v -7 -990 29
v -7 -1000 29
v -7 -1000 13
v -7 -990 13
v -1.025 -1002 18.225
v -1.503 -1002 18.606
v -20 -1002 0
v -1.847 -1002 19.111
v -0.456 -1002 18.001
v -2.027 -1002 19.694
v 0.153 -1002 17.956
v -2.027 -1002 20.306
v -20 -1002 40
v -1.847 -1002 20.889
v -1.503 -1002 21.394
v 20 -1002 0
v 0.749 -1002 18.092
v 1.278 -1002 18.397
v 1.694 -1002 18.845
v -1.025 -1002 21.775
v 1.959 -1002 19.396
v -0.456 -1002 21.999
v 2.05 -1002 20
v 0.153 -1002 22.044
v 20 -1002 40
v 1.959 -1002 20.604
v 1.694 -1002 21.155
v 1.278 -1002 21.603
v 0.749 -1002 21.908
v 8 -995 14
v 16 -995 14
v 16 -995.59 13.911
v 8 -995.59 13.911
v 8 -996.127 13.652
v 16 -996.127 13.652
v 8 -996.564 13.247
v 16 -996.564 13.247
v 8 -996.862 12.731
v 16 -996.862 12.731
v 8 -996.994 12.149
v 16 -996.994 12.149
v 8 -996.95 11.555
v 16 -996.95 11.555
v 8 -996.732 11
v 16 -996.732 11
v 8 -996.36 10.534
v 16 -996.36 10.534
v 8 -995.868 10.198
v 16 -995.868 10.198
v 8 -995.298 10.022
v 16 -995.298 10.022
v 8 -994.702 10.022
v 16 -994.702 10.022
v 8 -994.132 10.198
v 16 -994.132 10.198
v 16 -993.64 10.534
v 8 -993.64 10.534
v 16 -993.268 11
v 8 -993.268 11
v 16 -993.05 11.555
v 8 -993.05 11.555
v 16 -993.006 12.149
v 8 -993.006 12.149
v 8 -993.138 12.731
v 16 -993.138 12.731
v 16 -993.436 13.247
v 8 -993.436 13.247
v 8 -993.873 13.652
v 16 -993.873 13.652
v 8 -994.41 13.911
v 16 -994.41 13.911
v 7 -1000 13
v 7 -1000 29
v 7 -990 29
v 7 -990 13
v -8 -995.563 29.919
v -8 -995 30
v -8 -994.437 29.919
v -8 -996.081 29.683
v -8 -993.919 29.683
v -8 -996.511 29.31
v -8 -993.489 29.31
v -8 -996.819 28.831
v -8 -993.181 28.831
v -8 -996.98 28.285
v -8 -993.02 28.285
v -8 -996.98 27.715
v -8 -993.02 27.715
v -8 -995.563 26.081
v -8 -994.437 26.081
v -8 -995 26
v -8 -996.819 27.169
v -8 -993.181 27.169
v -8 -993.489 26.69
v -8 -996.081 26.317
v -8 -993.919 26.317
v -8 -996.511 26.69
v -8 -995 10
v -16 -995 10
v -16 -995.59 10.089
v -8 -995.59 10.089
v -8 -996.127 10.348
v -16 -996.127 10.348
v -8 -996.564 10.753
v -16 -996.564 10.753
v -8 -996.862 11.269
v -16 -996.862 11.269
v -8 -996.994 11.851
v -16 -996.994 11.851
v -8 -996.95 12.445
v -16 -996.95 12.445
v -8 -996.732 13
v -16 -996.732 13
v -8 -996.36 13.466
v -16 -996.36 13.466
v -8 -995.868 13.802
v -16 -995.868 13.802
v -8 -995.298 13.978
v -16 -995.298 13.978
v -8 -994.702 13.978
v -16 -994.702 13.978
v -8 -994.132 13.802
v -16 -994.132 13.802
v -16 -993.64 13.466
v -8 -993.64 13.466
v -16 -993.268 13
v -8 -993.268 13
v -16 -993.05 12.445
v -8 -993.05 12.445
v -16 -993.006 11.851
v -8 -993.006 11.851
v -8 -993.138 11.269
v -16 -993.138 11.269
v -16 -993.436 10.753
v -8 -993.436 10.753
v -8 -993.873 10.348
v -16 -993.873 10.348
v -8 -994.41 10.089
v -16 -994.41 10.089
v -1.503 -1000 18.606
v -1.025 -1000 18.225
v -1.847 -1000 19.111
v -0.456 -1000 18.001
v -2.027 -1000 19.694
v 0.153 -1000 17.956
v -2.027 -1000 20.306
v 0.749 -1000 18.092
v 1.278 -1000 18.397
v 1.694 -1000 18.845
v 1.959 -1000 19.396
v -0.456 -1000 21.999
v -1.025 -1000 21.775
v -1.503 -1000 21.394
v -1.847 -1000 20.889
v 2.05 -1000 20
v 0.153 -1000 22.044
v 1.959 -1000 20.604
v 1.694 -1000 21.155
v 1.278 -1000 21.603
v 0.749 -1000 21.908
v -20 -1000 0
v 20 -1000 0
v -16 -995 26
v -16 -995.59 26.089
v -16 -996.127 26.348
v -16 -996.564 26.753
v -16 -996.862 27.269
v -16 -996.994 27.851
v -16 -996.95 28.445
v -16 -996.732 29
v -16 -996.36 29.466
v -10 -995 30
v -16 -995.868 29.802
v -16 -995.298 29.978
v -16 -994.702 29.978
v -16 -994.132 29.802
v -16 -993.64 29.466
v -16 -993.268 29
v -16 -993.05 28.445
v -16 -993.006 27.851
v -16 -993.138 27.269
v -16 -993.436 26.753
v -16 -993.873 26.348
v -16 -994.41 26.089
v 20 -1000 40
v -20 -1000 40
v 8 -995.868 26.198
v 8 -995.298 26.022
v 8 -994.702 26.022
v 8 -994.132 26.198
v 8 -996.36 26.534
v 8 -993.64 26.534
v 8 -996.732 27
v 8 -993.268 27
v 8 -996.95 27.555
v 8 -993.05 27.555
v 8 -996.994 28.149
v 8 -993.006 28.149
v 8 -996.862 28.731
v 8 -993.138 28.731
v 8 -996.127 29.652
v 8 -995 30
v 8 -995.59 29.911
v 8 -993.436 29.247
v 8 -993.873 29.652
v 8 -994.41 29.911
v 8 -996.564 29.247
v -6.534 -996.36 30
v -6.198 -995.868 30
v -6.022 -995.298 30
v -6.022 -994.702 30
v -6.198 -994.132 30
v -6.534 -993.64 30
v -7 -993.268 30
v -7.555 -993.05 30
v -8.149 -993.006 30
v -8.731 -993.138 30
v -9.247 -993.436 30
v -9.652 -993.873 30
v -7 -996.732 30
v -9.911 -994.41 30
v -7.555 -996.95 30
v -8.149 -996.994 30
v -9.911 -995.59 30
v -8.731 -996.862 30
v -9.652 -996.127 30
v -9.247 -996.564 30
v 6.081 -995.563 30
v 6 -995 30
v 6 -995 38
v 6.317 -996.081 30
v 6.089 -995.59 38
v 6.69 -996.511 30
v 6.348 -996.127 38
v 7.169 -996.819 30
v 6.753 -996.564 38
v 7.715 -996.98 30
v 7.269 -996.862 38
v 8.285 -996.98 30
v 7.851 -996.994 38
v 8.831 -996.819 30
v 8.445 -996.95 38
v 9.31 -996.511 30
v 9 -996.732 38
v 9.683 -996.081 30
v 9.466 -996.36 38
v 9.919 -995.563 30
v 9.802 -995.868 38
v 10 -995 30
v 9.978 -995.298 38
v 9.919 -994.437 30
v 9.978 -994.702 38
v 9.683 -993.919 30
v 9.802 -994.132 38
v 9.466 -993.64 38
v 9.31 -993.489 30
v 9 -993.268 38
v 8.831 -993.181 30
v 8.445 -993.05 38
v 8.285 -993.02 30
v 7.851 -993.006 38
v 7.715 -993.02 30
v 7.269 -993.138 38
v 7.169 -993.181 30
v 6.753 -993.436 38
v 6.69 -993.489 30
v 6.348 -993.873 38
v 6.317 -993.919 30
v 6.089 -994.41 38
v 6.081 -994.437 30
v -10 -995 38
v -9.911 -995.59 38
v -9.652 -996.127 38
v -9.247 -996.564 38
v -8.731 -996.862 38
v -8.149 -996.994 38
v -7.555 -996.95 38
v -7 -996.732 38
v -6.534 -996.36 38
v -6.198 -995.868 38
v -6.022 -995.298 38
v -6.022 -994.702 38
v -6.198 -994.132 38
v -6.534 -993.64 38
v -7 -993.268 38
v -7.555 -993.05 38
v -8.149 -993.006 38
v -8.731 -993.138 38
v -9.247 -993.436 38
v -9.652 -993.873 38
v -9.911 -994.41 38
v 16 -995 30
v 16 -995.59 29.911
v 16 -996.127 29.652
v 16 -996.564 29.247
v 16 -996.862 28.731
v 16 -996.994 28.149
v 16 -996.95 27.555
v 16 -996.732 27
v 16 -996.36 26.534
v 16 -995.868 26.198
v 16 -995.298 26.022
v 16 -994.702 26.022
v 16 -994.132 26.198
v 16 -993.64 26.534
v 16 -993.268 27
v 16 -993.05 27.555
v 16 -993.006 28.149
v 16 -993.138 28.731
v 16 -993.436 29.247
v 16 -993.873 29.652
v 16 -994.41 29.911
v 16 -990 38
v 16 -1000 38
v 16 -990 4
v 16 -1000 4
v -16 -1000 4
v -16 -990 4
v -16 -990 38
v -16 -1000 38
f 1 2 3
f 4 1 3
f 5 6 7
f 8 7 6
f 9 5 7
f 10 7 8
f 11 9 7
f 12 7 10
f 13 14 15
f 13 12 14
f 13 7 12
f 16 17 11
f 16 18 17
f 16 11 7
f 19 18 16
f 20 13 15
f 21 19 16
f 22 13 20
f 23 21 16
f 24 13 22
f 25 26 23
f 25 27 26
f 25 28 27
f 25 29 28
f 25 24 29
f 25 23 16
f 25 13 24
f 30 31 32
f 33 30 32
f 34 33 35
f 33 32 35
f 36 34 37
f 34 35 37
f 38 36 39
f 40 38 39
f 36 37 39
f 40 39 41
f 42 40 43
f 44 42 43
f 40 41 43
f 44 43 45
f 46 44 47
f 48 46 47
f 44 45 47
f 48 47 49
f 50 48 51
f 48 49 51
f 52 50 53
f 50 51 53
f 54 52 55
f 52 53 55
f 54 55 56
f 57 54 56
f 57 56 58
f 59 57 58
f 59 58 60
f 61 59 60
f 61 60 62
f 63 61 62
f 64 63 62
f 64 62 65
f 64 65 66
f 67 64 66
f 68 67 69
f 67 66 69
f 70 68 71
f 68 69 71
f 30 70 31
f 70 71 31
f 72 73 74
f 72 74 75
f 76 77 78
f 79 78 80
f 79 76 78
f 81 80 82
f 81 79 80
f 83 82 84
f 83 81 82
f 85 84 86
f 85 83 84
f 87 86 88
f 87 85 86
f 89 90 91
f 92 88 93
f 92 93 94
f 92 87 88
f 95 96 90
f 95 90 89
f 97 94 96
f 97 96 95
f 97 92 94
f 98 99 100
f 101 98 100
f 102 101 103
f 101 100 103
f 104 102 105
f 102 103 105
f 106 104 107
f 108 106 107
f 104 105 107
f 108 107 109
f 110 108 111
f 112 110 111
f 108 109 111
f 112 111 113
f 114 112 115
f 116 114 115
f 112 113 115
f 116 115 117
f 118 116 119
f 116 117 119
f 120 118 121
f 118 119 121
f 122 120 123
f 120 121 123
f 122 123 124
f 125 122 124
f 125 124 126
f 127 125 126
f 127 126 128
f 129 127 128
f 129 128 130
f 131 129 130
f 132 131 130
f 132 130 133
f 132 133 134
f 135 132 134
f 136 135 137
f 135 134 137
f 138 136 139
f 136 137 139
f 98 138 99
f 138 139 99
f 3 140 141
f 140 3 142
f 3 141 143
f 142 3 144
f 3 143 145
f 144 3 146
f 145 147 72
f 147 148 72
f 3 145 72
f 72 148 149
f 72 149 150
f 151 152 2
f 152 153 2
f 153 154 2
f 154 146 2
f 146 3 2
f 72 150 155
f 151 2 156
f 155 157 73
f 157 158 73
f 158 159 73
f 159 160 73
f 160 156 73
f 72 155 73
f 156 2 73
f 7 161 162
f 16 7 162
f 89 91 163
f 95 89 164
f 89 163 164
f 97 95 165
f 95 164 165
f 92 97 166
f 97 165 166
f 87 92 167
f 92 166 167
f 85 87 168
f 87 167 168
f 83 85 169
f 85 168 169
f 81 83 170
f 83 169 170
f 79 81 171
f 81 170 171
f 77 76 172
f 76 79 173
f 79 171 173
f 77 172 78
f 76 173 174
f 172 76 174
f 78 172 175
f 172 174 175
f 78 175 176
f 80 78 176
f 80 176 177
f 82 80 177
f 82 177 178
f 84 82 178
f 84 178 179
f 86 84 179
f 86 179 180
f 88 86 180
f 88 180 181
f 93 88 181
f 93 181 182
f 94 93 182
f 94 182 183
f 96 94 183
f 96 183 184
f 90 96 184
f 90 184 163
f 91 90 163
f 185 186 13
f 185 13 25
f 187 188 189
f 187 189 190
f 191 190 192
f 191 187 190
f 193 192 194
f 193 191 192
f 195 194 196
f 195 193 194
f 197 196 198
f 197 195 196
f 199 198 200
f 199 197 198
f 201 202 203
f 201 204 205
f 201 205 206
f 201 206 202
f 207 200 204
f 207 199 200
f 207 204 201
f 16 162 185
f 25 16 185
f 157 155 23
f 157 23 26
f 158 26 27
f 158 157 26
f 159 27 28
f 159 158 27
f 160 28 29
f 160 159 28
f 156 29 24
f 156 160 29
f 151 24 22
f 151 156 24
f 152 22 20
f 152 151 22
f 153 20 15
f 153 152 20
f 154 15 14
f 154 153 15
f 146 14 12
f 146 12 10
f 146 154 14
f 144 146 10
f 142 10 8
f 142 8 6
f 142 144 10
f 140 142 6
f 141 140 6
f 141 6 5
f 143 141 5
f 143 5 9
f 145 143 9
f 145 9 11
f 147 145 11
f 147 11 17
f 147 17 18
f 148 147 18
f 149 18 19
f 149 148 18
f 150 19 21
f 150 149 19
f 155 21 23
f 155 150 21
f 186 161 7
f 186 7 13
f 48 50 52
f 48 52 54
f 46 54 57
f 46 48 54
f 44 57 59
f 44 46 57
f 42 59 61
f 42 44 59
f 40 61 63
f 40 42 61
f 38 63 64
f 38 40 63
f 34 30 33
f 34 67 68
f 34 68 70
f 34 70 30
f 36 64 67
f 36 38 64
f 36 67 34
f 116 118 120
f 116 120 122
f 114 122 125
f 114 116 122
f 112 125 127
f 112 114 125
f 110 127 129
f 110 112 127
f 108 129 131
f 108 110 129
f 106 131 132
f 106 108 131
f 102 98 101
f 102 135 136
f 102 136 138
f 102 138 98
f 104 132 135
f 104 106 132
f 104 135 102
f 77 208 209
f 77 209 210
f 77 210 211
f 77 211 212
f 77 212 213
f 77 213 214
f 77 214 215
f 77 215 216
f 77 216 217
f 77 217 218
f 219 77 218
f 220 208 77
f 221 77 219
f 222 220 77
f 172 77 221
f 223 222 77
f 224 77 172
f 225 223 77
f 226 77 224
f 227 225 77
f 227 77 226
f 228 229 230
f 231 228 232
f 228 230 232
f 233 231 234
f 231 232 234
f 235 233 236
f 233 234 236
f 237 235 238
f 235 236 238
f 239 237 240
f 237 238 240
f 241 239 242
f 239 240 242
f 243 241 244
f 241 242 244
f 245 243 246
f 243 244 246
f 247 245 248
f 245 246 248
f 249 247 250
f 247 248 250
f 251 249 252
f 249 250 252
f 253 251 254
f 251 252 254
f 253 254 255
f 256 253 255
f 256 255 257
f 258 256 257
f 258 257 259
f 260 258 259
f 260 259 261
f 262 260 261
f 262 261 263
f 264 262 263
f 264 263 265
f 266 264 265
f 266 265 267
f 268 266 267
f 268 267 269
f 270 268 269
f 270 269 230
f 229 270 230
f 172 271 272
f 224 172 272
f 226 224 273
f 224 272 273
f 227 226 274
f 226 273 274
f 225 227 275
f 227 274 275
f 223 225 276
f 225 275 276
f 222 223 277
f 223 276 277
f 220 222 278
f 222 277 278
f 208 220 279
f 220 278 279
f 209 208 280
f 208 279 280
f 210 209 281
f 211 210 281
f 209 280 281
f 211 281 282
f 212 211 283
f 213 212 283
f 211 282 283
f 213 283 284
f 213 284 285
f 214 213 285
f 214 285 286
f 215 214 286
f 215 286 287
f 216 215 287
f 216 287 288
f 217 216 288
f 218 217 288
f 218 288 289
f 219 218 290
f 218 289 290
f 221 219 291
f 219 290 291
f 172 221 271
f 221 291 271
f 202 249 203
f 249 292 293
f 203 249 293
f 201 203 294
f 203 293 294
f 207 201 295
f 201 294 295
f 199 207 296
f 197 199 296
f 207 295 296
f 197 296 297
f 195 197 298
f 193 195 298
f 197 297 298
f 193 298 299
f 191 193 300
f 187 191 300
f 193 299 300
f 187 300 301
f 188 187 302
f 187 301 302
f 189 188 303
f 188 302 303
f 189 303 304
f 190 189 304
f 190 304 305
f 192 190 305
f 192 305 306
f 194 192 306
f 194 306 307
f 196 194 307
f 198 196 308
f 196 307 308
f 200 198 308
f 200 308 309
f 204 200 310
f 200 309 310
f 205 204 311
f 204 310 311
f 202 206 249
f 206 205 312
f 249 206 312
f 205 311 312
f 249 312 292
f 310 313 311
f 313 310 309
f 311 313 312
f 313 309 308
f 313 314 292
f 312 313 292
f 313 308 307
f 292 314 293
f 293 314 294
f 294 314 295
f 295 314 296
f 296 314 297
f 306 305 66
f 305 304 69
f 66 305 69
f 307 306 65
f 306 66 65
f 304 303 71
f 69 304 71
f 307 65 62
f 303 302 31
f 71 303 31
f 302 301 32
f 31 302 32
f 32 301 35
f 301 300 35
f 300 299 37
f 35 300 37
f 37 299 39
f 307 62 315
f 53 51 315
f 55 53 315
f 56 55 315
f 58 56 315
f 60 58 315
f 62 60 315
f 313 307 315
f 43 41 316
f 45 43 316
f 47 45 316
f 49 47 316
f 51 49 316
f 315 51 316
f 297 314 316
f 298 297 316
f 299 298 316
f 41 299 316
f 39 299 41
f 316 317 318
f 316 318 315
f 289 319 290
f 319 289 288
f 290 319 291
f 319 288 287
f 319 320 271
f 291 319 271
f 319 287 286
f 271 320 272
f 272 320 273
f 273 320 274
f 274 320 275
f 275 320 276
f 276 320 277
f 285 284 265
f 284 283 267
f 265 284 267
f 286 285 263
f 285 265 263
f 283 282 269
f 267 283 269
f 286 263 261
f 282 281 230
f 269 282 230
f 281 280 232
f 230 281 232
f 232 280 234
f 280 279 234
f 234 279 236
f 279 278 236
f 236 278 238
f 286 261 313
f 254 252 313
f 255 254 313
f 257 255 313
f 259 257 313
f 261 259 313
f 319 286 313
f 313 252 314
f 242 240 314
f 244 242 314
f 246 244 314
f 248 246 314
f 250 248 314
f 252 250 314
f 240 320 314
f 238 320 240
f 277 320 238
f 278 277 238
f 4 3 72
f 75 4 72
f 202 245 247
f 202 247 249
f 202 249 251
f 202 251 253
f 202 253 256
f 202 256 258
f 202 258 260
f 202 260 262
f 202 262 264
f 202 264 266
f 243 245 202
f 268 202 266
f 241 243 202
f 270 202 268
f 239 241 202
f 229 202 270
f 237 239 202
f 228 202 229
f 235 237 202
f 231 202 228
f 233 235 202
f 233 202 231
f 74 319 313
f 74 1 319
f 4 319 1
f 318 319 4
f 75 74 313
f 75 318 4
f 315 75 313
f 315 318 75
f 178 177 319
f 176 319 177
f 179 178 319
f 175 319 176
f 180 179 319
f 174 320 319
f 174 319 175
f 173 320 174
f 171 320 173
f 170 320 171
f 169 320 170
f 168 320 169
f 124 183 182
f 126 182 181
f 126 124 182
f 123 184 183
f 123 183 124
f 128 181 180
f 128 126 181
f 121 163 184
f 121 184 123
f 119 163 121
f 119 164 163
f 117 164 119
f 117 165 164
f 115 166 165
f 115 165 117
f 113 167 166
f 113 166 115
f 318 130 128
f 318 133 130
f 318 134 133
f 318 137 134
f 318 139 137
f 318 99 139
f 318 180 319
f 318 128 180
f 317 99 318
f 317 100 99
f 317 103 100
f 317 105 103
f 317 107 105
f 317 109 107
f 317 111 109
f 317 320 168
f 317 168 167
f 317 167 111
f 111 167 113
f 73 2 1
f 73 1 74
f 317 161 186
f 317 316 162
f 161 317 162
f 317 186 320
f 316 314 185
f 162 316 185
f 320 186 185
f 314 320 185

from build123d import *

# Parameters (mm, degrees)
SKETCH003_W     = 40
SKETCH003_H     = 40
SKETCH003_R     = 2.05
PAD003_DEPTH    = 2
SKETCH006_W     = 32
SKETCH006_H     = 34
SKETCH006_W_2   = 14
SKETCH006_H_2   = 16
PAD005_DEPTH    = 10
SKETCH029_R     = 2
POCKET010_DEPTH = 8
SKETCH030_R     = 2
POCKET011_DEPTH = 8
SKETCH031_R     = 2
POCKET012_DEPTH = 8


with BuildPart() as part:
    # Sketch003 → Pad003 (new body)
    with BuildSketch(Plane.XZ):
        with Locations((0, 20)):
            Rectangle(SKETCH003_W, SKETCH003_H)
        with Locations((0, 20)):
            Circle(SKETCH003_R, mode=Mode.SUBTRACT)
    extrude(amount=PAD003_DEPTH)

    # Sketch006 (on Face6 of Pad003) → Pad005 (join)
    with BuildSketch(Plane(origin=(0, 0, 0), x_dir=(1, 0, 0), z_dir=(0, 1, 0))):
        with Locations((0, -21)):
            Rectangle(SKETCH006_W, SKETCH006_H)
        with Locations((0, -21)):
            Rectangle(SKETCH006_W_2, SKETCH006_H_2, mode=Mode.SUBTRACT)
    extrude(amount=PAD005_DEPTH)

    # Sketch029 (on Face8 of Pad005) → Pocket010 (cut)
    with BuildSketch(Plane(origin=(0, 0, 38), x_dir=(-1, 0, 0), z_dir=(0, 0, 1))):
        with Locations((-8, -5)):
            Circle(SKETCH029_R)
        with Locations((8, -5)):
            Circle(SKETCH029_R)
    extrude(amount=-POCKET010_DEPTH, mode=Mode.SUBTRACT)

    # Sketch030 (on Face7 of Pocket010) → Pocket011 (cut)
    with BuildSketch(Plane(origin=(-16, 0, 0), x_dir=(0, 0, -1), z_dir=(-1, 0, 0))):
        with Locations((-28, -5)):
            Circle(SKETCH030_R)
        with Locations((-12, -5)):
            Circle(SKETCH030_R)
    extrude(amount=-POCKET011_DEPTH, mode=Mode.SUBTRACT)

    # Sketch031 (on Face9 of Pocket011) → Pocket012 (cut)
    with BuildSketch(Plane(origin=(16, 0, 0), x_dir=(0, 0, 1), z_dir=(1, 0, 0))):
        with Locations((12, -5)):
            Circle(SKETCH031_R)
        with Locations((28, -5)):
            Circle(SKETCH031_R)
    extrude(amount=-POCKET012_DEPTH, mode=Mode.SUBTRACT)


with BuildPart() as part_1:
    # Body003 placement: moved
    add(part.part.moved(Location((0, -1000, 0))))


solid = part_1.part
